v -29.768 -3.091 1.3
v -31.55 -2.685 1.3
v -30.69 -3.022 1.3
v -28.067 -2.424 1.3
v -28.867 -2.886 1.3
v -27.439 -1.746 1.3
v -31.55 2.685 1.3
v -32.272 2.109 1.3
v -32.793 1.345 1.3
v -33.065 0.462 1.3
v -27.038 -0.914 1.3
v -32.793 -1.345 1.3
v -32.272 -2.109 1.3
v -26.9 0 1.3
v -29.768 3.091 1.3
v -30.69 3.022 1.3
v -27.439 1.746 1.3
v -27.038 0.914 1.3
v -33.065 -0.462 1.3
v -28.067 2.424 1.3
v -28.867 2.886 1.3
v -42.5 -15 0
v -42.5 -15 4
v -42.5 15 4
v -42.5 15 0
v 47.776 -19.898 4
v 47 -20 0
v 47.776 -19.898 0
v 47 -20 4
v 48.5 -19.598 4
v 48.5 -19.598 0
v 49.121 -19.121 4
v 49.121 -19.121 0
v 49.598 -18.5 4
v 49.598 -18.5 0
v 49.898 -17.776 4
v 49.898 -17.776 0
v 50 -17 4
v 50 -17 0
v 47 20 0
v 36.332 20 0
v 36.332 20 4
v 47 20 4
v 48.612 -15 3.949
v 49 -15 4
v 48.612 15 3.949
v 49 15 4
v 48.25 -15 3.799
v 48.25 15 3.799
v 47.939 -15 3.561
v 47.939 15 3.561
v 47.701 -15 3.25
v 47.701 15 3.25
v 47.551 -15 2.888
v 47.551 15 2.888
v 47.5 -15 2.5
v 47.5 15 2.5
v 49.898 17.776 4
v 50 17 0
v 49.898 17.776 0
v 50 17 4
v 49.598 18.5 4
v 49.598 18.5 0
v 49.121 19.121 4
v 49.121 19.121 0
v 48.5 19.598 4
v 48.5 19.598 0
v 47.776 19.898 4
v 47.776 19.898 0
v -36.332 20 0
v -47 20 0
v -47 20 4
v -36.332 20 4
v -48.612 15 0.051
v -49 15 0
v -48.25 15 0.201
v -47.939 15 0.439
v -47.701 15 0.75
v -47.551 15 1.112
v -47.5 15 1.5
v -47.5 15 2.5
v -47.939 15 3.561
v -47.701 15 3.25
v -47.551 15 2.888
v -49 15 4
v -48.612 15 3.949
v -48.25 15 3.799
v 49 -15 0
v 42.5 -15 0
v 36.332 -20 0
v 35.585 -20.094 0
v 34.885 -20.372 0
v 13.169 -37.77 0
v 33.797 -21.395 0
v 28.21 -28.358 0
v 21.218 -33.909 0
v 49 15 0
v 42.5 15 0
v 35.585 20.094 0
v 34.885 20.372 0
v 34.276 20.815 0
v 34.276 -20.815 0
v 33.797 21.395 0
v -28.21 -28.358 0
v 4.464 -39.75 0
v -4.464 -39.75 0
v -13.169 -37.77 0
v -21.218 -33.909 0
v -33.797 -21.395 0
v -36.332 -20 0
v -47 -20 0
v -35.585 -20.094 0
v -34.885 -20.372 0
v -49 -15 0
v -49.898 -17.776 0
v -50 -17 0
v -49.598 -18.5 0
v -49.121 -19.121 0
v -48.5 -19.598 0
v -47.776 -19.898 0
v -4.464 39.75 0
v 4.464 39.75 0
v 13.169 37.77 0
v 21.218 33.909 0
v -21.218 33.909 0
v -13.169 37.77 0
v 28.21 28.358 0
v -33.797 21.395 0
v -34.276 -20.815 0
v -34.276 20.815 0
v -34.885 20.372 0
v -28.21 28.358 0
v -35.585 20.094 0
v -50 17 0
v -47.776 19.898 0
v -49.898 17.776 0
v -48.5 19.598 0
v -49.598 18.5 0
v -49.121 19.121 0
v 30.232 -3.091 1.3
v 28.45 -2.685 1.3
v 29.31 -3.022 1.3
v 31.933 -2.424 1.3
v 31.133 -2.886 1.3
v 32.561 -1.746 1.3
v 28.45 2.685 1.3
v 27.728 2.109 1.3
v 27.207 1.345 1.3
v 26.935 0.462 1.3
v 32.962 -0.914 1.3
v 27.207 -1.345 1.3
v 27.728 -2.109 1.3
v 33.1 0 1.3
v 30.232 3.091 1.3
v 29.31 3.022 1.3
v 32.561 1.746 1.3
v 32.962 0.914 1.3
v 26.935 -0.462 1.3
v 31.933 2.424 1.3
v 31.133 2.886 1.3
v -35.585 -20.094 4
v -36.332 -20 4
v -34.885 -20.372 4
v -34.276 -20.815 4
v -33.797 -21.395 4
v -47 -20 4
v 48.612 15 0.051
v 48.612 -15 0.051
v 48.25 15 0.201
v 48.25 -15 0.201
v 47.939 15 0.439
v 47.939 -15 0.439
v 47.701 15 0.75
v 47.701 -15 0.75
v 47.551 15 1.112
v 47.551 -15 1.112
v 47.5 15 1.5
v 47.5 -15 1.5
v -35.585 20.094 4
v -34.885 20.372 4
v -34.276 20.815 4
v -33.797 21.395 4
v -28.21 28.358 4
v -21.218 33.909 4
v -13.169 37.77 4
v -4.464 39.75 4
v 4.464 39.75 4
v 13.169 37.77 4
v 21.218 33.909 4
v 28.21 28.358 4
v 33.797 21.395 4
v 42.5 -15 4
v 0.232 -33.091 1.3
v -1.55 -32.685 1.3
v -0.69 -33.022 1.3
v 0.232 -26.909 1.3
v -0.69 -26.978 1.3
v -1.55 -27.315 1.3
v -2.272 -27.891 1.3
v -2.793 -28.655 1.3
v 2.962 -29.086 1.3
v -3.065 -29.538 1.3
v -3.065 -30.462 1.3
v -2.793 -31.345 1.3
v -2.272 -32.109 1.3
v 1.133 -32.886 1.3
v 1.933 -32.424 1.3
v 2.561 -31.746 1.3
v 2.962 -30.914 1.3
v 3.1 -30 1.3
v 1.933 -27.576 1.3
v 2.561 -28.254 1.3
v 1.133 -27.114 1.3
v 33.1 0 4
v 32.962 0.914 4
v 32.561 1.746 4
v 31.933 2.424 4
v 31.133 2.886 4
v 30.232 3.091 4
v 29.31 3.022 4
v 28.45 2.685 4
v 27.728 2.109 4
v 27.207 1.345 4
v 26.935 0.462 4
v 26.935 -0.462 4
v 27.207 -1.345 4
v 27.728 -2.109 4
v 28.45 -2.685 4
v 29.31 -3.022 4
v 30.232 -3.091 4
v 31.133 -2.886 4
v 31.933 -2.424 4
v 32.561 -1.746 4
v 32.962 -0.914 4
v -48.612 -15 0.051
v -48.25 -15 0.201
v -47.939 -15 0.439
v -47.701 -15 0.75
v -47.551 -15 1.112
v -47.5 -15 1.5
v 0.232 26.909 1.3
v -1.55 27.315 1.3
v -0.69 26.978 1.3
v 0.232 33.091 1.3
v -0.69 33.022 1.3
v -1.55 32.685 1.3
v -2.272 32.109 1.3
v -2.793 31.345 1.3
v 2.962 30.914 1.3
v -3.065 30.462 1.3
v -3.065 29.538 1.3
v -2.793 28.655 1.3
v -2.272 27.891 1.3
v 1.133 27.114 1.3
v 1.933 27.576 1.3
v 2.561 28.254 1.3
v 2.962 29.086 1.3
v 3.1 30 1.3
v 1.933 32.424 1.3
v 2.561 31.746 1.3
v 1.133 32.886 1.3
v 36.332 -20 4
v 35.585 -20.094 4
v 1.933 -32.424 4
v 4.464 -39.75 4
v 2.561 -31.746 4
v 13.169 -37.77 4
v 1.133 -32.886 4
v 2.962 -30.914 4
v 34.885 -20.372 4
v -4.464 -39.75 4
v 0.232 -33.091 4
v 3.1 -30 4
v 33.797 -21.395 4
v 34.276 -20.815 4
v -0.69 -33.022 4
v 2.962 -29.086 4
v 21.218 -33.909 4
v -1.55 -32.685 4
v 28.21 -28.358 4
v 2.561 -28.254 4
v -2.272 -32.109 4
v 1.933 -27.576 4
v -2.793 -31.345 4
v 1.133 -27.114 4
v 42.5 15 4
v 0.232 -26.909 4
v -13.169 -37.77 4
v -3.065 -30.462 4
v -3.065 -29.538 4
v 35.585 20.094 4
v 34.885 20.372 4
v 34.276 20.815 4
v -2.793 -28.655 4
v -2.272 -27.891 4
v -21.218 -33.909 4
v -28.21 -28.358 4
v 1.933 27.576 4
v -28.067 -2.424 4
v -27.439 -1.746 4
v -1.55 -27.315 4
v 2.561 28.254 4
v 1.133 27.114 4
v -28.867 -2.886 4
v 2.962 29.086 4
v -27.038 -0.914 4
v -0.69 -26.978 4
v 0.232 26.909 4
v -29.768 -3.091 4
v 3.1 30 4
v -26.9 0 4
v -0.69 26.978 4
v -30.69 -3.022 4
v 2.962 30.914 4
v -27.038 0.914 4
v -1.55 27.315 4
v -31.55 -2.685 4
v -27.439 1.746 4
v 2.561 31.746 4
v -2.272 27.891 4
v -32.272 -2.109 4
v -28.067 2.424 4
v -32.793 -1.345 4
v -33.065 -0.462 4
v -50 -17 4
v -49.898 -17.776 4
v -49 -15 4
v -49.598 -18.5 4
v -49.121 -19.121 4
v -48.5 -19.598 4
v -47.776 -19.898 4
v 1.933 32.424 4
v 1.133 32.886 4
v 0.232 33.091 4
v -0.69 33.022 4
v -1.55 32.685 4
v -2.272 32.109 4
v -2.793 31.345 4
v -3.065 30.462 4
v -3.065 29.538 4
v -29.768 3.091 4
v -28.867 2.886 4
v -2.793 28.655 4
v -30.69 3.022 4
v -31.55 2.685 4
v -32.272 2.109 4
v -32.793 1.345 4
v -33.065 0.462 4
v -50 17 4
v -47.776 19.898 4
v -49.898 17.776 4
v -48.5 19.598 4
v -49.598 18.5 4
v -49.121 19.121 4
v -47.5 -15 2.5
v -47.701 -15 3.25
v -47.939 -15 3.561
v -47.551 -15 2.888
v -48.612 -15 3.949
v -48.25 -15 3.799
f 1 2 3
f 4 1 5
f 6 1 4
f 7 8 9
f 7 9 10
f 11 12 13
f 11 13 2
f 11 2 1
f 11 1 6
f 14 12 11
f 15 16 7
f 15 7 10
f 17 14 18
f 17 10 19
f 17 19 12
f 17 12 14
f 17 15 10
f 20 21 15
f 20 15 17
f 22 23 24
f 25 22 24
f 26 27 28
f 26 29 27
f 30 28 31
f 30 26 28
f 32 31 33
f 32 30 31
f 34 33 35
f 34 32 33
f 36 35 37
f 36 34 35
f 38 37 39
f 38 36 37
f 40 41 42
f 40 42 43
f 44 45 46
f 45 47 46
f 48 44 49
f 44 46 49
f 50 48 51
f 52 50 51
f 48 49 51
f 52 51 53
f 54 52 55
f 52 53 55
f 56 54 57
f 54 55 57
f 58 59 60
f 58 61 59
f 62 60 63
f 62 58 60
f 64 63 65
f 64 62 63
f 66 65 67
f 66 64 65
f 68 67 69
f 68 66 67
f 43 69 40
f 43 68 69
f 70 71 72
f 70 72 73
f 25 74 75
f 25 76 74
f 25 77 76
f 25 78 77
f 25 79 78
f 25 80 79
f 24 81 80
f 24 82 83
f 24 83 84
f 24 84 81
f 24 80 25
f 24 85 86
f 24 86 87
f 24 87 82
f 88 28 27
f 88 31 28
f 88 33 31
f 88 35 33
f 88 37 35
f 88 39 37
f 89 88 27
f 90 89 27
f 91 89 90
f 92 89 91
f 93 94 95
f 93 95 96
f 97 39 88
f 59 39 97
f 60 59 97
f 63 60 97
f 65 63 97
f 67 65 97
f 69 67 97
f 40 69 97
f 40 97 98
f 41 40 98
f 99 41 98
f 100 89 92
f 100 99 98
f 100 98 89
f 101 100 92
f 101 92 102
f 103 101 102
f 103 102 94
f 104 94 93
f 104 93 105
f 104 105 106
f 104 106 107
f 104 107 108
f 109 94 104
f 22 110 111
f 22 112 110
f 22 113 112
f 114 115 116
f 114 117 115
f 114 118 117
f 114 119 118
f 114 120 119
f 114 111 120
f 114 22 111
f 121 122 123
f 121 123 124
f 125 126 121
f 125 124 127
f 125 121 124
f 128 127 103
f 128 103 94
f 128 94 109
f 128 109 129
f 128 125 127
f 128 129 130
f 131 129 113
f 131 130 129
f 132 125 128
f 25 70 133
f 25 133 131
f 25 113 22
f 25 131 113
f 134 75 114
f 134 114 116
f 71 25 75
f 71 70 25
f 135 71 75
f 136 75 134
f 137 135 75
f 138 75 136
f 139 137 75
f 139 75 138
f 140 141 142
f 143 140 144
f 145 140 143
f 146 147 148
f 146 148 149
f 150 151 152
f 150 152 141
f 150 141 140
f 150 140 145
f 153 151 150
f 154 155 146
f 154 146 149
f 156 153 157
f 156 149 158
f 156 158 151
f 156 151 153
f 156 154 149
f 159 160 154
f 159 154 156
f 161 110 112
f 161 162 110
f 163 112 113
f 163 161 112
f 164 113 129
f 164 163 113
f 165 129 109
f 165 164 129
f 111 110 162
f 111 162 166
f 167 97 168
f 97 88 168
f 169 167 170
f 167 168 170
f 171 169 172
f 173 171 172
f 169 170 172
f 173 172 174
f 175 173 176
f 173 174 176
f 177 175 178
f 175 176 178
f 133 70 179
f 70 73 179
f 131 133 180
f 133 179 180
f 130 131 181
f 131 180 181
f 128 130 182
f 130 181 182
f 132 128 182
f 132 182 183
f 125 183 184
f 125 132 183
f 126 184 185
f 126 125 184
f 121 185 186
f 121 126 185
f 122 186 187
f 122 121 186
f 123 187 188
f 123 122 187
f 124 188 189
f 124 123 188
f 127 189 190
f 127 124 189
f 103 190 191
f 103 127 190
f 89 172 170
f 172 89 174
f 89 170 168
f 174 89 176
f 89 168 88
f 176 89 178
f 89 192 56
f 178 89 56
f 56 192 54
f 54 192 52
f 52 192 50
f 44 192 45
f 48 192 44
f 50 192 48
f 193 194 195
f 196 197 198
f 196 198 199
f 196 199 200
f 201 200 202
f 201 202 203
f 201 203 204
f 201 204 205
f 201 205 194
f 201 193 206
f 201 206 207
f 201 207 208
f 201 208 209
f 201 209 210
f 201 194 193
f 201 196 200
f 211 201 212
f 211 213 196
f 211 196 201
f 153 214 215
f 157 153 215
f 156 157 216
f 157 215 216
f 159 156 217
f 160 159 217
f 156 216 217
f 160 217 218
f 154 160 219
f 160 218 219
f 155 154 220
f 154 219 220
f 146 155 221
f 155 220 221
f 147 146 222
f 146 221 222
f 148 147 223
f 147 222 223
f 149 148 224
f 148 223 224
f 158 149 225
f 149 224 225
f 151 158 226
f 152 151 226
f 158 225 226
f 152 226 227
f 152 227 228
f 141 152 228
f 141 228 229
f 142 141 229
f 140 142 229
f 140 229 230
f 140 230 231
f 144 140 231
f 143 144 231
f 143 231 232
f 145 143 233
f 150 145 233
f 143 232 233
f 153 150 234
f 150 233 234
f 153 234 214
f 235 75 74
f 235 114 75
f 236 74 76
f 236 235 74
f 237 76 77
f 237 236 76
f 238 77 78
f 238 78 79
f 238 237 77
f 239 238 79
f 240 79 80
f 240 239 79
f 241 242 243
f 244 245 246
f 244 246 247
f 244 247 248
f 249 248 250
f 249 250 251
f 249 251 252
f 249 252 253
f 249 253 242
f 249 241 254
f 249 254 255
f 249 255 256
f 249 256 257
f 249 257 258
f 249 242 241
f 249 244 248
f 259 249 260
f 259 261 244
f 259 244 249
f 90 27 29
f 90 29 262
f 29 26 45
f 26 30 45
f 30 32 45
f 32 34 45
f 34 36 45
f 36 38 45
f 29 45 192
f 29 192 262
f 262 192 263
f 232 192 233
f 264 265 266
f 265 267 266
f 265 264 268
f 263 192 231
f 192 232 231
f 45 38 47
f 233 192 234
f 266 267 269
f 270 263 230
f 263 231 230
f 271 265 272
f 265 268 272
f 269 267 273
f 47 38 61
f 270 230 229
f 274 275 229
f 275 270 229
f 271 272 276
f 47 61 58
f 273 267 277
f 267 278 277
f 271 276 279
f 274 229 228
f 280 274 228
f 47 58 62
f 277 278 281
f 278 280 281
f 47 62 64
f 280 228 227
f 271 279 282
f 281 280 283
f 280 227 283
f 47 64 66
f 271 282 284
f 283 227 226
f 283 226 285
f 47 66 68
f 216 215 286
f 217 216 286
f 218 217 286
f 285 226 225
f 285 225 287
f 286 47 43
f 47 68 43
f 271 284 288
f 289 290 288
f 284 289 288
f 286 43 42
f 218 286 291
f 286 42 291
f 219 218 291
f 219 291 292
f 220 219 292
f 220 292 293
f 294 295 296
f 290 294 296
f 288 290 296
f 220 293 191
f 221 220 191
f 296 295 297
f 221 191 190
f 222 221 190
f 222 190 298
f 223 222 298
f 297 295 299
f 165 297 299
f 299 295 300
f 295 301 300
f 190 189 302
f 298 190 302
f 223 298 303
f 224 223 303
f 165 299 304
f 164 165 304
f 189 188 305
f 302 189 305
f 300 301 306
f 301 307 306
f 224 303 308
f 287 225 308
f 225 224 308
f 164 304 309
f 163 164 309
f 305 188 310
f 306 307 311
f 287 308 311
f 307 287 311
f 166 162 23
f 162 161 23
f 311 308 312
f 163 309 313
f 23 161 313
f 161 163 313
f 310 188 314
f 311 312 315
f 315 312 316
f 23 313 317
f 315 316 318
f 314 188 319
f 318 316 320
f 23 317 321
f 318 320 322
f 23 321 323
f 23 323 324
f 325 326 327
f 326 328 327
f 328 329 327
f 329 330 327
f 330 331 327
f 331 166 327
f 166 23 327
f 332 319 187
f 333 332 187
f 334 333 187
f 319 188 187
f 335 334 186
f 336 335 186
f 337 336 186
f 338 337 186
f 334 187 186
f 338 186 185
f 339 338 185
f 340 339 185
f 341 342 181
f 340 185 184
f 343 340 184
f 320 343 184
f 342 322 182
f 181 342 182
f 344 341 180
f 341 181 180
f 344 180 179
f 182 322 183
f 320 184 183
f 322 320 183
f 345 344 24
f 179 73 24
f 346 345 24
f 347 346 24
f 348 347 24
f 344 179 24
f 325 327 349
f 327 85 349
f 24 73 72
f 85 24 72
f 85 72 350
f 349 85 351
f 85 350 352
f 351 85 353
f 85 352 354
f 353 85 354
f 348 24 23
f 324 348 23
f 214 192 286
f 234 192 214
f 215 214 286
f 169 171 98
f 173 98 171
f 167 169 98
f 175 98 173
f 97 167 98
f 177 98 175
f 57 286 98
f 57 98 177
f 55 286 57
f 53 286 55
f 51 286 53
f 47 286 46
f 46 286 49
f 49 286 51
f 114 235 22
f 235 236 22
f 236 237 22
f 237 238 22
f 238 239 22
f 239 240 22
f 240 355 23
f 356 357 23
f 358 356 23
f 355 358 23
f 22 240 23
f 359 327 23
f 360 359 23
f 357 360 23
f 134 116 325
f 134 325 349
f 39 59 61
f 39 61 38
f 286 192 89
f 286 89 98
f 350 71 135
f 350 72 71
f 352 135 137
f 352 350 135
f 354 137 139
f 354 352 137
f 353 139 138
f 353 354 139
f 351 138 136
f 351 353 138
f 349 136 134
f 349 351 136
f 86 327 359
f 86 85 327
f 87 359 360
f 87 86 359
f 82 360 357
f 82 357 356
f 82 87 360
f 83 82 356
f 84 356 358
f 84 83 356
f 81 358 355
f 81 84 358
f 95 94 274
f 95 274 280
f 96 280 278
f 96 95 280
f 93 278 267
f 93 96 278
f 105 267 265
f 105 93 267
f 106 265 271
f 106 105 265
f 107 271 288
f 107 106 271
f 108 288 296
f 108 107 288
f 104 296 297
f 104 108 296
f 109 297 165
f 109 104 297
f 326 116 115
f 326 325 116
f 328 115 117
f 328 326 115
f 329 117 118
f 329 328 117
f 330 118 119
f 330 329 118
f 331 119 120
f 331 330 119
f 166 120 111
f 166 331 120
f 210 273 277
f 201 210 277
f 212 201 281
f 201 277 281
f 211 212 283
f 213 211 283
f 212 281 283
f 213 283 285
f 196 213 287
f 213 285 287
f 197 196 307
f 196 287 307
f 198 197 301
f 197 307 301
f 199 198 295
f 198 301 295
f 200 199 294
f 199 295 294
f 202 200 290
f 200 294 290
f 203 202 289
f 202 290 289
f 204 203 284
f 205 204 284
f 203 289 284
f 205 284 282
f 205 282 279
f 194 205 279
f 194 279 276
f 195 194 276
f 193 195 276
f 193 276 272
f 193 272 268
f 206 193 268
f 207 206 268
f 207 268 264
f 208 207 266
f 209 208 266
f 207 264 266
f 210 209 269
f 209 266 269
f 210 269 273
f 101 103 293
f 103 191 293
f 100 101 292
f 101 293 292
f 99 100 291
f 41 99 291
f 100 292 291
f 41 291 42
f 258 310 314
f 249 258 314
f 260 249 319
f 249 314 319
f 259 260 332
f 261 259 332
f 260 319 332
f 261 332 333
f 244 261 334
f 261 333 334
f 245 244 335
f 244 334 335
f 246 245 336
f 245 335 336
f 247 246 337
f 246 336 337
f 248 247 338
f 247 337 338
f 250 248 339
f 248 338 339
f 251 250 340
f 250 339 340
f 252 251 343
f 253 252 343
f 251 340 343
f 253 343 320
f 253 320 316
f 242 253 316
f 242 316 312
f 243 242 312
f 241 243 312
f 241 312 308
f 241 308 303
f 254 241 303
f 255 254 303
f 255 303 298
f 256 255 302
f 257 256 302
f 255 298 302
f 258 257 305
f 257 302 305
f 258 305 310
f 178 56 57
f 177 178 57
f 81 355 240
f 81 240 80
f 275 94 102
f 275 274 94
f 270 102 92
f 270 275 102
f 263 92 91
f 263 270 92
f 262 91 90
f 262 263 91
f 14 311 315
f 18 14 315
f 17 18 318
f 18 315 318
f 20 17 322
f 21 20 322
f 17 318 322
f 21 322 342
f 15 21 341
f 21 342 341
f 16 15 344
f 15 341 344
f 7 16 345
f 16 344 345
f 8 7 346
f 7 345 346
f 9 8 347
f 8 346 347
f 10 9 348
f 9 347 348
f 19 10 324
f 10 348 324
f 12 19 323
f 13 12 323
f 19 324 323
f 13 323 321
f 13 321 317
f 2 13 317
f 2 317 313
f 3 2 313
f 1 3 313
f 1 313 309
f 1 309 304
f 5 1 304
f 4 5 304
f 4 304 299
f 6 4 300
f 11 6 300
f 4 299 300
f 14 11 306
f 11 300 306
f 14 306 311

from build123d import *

# Parameters (mm, degrees)
BOSS_EXTRU_1_DEPTH           = 4
ESQUISSE2_R                  = 3.1
ENL_V_MAT_EXTRU_1_DEPTH      = 1
ENL_V_MAT_EXTRU_1_DEPTH_BACK = 2.7
ESQUISSE3_W                  = 5
ESQUISSE3_H                  = 30
ENL_V_MAT_EXTRU_2_DEPTH      = 12.7
CONG_1_R                     = 1.5
CONG_2_R                     = 3
CONG_3_R                     = 3


with BuildPart() as part:
    # Esquisse1 → Boss.-Extru.1 (new body)
    with BuildSketch(Plane.XY):
        with BuildLine():
            Line((-34.641016151, -20), (-50, -20))
            Line((-50, -20), (-50, 20))
            Line((-50, 20), (-34.641016151, 20))
            ThreePointArc((-34.641016151, 20), (0, 40), (34.641016151, 20))
            Line((34.641016151, 20), (50, 20))
            Line((50, 20), (50, -20))
            Line((50, -20), (34.641016151, -20))
            ThreePointArc((34.641016151, -20), (0, -40), (-34.641016151, -20))
        make_face()
    extrude(amount=BOSS_EXTRU_1_DEPTH)

    # Esquisse2 → Enlèv. mat.-Extru.1 (cut, two sides)
    with BuildSketch(Plane.XY.offset(4)) as enl_v_mat_extru_1_sk:
        with Locations((0, 30)):
            Circle(ESQUISSE2_R)
        with Locations((30, 0)):
            Circle(ESQUISSE2_R)
        with Locations((0, -30)):
            Circle(ESQUISSE2_R)
        with Locations((-30, 0)):
            Circle(ESQUISSE2_R)
    extrude(amount=ENL_V_MAT_EXTRU_1_DEPTH, mode=Mode.SUBTRACT)
    extrude(enl_v_mat_extru_1_sk.sketch, amount=-ENL_V_MAT_EXTRU_1_DEPTH_BACK, mode=Mode.SUBTRACT)

    # Esquisse3 → Enlèv. mat.-Extru.2 (cut)
    with BuildSketch(Plane.XY.offset(4)):
        with Locations((-45, 0)):
            Rectangle(ESQUISSE3_W, ESQUISSE3_H)
        with Locations((45, 0)):
            Rectangle(ESQUISSE3_W, ESQUISSE3_H)
    extrude(amount=-ENL_V_MAT_EXTRU_2_DEPTH, mode=Mode.SUBTRACT)

    # Congé1
    cong_1_edges = [part.edges().sort_by_distance(p)[0] for p in [
        (47.5, 0, 0),
        (-47.5, 0, 0),
        (-47.5, 0, 4),
        (47.5, 0, 4),
    ]]
    fillet(cong_1_edges, radius=CONG_1_R)

    # Congé2
    cong_2_edges = [part.edges().sort_by_distance(p)[0] for p in [
        (50, 20, 2),
        (50, -20, 2),
        (-50, -20, 2),
        (-50, 20, 2),
    ]]
    fillet(cong_2_edges, radius=CONG_2_R)

    # Congé3
    cong_3_edges = [part.edges().sort_by_distance(p)[0] for p in [
        (34.641016151, 20, 2),
        (34.641016151, -20, 2),
        (-34.641016151, -20, 2),
        (-34.641016151, 20, 2),
    ]]
    fillet(cong_3_edges, radius=CONG_3_R)


solid = part.part
